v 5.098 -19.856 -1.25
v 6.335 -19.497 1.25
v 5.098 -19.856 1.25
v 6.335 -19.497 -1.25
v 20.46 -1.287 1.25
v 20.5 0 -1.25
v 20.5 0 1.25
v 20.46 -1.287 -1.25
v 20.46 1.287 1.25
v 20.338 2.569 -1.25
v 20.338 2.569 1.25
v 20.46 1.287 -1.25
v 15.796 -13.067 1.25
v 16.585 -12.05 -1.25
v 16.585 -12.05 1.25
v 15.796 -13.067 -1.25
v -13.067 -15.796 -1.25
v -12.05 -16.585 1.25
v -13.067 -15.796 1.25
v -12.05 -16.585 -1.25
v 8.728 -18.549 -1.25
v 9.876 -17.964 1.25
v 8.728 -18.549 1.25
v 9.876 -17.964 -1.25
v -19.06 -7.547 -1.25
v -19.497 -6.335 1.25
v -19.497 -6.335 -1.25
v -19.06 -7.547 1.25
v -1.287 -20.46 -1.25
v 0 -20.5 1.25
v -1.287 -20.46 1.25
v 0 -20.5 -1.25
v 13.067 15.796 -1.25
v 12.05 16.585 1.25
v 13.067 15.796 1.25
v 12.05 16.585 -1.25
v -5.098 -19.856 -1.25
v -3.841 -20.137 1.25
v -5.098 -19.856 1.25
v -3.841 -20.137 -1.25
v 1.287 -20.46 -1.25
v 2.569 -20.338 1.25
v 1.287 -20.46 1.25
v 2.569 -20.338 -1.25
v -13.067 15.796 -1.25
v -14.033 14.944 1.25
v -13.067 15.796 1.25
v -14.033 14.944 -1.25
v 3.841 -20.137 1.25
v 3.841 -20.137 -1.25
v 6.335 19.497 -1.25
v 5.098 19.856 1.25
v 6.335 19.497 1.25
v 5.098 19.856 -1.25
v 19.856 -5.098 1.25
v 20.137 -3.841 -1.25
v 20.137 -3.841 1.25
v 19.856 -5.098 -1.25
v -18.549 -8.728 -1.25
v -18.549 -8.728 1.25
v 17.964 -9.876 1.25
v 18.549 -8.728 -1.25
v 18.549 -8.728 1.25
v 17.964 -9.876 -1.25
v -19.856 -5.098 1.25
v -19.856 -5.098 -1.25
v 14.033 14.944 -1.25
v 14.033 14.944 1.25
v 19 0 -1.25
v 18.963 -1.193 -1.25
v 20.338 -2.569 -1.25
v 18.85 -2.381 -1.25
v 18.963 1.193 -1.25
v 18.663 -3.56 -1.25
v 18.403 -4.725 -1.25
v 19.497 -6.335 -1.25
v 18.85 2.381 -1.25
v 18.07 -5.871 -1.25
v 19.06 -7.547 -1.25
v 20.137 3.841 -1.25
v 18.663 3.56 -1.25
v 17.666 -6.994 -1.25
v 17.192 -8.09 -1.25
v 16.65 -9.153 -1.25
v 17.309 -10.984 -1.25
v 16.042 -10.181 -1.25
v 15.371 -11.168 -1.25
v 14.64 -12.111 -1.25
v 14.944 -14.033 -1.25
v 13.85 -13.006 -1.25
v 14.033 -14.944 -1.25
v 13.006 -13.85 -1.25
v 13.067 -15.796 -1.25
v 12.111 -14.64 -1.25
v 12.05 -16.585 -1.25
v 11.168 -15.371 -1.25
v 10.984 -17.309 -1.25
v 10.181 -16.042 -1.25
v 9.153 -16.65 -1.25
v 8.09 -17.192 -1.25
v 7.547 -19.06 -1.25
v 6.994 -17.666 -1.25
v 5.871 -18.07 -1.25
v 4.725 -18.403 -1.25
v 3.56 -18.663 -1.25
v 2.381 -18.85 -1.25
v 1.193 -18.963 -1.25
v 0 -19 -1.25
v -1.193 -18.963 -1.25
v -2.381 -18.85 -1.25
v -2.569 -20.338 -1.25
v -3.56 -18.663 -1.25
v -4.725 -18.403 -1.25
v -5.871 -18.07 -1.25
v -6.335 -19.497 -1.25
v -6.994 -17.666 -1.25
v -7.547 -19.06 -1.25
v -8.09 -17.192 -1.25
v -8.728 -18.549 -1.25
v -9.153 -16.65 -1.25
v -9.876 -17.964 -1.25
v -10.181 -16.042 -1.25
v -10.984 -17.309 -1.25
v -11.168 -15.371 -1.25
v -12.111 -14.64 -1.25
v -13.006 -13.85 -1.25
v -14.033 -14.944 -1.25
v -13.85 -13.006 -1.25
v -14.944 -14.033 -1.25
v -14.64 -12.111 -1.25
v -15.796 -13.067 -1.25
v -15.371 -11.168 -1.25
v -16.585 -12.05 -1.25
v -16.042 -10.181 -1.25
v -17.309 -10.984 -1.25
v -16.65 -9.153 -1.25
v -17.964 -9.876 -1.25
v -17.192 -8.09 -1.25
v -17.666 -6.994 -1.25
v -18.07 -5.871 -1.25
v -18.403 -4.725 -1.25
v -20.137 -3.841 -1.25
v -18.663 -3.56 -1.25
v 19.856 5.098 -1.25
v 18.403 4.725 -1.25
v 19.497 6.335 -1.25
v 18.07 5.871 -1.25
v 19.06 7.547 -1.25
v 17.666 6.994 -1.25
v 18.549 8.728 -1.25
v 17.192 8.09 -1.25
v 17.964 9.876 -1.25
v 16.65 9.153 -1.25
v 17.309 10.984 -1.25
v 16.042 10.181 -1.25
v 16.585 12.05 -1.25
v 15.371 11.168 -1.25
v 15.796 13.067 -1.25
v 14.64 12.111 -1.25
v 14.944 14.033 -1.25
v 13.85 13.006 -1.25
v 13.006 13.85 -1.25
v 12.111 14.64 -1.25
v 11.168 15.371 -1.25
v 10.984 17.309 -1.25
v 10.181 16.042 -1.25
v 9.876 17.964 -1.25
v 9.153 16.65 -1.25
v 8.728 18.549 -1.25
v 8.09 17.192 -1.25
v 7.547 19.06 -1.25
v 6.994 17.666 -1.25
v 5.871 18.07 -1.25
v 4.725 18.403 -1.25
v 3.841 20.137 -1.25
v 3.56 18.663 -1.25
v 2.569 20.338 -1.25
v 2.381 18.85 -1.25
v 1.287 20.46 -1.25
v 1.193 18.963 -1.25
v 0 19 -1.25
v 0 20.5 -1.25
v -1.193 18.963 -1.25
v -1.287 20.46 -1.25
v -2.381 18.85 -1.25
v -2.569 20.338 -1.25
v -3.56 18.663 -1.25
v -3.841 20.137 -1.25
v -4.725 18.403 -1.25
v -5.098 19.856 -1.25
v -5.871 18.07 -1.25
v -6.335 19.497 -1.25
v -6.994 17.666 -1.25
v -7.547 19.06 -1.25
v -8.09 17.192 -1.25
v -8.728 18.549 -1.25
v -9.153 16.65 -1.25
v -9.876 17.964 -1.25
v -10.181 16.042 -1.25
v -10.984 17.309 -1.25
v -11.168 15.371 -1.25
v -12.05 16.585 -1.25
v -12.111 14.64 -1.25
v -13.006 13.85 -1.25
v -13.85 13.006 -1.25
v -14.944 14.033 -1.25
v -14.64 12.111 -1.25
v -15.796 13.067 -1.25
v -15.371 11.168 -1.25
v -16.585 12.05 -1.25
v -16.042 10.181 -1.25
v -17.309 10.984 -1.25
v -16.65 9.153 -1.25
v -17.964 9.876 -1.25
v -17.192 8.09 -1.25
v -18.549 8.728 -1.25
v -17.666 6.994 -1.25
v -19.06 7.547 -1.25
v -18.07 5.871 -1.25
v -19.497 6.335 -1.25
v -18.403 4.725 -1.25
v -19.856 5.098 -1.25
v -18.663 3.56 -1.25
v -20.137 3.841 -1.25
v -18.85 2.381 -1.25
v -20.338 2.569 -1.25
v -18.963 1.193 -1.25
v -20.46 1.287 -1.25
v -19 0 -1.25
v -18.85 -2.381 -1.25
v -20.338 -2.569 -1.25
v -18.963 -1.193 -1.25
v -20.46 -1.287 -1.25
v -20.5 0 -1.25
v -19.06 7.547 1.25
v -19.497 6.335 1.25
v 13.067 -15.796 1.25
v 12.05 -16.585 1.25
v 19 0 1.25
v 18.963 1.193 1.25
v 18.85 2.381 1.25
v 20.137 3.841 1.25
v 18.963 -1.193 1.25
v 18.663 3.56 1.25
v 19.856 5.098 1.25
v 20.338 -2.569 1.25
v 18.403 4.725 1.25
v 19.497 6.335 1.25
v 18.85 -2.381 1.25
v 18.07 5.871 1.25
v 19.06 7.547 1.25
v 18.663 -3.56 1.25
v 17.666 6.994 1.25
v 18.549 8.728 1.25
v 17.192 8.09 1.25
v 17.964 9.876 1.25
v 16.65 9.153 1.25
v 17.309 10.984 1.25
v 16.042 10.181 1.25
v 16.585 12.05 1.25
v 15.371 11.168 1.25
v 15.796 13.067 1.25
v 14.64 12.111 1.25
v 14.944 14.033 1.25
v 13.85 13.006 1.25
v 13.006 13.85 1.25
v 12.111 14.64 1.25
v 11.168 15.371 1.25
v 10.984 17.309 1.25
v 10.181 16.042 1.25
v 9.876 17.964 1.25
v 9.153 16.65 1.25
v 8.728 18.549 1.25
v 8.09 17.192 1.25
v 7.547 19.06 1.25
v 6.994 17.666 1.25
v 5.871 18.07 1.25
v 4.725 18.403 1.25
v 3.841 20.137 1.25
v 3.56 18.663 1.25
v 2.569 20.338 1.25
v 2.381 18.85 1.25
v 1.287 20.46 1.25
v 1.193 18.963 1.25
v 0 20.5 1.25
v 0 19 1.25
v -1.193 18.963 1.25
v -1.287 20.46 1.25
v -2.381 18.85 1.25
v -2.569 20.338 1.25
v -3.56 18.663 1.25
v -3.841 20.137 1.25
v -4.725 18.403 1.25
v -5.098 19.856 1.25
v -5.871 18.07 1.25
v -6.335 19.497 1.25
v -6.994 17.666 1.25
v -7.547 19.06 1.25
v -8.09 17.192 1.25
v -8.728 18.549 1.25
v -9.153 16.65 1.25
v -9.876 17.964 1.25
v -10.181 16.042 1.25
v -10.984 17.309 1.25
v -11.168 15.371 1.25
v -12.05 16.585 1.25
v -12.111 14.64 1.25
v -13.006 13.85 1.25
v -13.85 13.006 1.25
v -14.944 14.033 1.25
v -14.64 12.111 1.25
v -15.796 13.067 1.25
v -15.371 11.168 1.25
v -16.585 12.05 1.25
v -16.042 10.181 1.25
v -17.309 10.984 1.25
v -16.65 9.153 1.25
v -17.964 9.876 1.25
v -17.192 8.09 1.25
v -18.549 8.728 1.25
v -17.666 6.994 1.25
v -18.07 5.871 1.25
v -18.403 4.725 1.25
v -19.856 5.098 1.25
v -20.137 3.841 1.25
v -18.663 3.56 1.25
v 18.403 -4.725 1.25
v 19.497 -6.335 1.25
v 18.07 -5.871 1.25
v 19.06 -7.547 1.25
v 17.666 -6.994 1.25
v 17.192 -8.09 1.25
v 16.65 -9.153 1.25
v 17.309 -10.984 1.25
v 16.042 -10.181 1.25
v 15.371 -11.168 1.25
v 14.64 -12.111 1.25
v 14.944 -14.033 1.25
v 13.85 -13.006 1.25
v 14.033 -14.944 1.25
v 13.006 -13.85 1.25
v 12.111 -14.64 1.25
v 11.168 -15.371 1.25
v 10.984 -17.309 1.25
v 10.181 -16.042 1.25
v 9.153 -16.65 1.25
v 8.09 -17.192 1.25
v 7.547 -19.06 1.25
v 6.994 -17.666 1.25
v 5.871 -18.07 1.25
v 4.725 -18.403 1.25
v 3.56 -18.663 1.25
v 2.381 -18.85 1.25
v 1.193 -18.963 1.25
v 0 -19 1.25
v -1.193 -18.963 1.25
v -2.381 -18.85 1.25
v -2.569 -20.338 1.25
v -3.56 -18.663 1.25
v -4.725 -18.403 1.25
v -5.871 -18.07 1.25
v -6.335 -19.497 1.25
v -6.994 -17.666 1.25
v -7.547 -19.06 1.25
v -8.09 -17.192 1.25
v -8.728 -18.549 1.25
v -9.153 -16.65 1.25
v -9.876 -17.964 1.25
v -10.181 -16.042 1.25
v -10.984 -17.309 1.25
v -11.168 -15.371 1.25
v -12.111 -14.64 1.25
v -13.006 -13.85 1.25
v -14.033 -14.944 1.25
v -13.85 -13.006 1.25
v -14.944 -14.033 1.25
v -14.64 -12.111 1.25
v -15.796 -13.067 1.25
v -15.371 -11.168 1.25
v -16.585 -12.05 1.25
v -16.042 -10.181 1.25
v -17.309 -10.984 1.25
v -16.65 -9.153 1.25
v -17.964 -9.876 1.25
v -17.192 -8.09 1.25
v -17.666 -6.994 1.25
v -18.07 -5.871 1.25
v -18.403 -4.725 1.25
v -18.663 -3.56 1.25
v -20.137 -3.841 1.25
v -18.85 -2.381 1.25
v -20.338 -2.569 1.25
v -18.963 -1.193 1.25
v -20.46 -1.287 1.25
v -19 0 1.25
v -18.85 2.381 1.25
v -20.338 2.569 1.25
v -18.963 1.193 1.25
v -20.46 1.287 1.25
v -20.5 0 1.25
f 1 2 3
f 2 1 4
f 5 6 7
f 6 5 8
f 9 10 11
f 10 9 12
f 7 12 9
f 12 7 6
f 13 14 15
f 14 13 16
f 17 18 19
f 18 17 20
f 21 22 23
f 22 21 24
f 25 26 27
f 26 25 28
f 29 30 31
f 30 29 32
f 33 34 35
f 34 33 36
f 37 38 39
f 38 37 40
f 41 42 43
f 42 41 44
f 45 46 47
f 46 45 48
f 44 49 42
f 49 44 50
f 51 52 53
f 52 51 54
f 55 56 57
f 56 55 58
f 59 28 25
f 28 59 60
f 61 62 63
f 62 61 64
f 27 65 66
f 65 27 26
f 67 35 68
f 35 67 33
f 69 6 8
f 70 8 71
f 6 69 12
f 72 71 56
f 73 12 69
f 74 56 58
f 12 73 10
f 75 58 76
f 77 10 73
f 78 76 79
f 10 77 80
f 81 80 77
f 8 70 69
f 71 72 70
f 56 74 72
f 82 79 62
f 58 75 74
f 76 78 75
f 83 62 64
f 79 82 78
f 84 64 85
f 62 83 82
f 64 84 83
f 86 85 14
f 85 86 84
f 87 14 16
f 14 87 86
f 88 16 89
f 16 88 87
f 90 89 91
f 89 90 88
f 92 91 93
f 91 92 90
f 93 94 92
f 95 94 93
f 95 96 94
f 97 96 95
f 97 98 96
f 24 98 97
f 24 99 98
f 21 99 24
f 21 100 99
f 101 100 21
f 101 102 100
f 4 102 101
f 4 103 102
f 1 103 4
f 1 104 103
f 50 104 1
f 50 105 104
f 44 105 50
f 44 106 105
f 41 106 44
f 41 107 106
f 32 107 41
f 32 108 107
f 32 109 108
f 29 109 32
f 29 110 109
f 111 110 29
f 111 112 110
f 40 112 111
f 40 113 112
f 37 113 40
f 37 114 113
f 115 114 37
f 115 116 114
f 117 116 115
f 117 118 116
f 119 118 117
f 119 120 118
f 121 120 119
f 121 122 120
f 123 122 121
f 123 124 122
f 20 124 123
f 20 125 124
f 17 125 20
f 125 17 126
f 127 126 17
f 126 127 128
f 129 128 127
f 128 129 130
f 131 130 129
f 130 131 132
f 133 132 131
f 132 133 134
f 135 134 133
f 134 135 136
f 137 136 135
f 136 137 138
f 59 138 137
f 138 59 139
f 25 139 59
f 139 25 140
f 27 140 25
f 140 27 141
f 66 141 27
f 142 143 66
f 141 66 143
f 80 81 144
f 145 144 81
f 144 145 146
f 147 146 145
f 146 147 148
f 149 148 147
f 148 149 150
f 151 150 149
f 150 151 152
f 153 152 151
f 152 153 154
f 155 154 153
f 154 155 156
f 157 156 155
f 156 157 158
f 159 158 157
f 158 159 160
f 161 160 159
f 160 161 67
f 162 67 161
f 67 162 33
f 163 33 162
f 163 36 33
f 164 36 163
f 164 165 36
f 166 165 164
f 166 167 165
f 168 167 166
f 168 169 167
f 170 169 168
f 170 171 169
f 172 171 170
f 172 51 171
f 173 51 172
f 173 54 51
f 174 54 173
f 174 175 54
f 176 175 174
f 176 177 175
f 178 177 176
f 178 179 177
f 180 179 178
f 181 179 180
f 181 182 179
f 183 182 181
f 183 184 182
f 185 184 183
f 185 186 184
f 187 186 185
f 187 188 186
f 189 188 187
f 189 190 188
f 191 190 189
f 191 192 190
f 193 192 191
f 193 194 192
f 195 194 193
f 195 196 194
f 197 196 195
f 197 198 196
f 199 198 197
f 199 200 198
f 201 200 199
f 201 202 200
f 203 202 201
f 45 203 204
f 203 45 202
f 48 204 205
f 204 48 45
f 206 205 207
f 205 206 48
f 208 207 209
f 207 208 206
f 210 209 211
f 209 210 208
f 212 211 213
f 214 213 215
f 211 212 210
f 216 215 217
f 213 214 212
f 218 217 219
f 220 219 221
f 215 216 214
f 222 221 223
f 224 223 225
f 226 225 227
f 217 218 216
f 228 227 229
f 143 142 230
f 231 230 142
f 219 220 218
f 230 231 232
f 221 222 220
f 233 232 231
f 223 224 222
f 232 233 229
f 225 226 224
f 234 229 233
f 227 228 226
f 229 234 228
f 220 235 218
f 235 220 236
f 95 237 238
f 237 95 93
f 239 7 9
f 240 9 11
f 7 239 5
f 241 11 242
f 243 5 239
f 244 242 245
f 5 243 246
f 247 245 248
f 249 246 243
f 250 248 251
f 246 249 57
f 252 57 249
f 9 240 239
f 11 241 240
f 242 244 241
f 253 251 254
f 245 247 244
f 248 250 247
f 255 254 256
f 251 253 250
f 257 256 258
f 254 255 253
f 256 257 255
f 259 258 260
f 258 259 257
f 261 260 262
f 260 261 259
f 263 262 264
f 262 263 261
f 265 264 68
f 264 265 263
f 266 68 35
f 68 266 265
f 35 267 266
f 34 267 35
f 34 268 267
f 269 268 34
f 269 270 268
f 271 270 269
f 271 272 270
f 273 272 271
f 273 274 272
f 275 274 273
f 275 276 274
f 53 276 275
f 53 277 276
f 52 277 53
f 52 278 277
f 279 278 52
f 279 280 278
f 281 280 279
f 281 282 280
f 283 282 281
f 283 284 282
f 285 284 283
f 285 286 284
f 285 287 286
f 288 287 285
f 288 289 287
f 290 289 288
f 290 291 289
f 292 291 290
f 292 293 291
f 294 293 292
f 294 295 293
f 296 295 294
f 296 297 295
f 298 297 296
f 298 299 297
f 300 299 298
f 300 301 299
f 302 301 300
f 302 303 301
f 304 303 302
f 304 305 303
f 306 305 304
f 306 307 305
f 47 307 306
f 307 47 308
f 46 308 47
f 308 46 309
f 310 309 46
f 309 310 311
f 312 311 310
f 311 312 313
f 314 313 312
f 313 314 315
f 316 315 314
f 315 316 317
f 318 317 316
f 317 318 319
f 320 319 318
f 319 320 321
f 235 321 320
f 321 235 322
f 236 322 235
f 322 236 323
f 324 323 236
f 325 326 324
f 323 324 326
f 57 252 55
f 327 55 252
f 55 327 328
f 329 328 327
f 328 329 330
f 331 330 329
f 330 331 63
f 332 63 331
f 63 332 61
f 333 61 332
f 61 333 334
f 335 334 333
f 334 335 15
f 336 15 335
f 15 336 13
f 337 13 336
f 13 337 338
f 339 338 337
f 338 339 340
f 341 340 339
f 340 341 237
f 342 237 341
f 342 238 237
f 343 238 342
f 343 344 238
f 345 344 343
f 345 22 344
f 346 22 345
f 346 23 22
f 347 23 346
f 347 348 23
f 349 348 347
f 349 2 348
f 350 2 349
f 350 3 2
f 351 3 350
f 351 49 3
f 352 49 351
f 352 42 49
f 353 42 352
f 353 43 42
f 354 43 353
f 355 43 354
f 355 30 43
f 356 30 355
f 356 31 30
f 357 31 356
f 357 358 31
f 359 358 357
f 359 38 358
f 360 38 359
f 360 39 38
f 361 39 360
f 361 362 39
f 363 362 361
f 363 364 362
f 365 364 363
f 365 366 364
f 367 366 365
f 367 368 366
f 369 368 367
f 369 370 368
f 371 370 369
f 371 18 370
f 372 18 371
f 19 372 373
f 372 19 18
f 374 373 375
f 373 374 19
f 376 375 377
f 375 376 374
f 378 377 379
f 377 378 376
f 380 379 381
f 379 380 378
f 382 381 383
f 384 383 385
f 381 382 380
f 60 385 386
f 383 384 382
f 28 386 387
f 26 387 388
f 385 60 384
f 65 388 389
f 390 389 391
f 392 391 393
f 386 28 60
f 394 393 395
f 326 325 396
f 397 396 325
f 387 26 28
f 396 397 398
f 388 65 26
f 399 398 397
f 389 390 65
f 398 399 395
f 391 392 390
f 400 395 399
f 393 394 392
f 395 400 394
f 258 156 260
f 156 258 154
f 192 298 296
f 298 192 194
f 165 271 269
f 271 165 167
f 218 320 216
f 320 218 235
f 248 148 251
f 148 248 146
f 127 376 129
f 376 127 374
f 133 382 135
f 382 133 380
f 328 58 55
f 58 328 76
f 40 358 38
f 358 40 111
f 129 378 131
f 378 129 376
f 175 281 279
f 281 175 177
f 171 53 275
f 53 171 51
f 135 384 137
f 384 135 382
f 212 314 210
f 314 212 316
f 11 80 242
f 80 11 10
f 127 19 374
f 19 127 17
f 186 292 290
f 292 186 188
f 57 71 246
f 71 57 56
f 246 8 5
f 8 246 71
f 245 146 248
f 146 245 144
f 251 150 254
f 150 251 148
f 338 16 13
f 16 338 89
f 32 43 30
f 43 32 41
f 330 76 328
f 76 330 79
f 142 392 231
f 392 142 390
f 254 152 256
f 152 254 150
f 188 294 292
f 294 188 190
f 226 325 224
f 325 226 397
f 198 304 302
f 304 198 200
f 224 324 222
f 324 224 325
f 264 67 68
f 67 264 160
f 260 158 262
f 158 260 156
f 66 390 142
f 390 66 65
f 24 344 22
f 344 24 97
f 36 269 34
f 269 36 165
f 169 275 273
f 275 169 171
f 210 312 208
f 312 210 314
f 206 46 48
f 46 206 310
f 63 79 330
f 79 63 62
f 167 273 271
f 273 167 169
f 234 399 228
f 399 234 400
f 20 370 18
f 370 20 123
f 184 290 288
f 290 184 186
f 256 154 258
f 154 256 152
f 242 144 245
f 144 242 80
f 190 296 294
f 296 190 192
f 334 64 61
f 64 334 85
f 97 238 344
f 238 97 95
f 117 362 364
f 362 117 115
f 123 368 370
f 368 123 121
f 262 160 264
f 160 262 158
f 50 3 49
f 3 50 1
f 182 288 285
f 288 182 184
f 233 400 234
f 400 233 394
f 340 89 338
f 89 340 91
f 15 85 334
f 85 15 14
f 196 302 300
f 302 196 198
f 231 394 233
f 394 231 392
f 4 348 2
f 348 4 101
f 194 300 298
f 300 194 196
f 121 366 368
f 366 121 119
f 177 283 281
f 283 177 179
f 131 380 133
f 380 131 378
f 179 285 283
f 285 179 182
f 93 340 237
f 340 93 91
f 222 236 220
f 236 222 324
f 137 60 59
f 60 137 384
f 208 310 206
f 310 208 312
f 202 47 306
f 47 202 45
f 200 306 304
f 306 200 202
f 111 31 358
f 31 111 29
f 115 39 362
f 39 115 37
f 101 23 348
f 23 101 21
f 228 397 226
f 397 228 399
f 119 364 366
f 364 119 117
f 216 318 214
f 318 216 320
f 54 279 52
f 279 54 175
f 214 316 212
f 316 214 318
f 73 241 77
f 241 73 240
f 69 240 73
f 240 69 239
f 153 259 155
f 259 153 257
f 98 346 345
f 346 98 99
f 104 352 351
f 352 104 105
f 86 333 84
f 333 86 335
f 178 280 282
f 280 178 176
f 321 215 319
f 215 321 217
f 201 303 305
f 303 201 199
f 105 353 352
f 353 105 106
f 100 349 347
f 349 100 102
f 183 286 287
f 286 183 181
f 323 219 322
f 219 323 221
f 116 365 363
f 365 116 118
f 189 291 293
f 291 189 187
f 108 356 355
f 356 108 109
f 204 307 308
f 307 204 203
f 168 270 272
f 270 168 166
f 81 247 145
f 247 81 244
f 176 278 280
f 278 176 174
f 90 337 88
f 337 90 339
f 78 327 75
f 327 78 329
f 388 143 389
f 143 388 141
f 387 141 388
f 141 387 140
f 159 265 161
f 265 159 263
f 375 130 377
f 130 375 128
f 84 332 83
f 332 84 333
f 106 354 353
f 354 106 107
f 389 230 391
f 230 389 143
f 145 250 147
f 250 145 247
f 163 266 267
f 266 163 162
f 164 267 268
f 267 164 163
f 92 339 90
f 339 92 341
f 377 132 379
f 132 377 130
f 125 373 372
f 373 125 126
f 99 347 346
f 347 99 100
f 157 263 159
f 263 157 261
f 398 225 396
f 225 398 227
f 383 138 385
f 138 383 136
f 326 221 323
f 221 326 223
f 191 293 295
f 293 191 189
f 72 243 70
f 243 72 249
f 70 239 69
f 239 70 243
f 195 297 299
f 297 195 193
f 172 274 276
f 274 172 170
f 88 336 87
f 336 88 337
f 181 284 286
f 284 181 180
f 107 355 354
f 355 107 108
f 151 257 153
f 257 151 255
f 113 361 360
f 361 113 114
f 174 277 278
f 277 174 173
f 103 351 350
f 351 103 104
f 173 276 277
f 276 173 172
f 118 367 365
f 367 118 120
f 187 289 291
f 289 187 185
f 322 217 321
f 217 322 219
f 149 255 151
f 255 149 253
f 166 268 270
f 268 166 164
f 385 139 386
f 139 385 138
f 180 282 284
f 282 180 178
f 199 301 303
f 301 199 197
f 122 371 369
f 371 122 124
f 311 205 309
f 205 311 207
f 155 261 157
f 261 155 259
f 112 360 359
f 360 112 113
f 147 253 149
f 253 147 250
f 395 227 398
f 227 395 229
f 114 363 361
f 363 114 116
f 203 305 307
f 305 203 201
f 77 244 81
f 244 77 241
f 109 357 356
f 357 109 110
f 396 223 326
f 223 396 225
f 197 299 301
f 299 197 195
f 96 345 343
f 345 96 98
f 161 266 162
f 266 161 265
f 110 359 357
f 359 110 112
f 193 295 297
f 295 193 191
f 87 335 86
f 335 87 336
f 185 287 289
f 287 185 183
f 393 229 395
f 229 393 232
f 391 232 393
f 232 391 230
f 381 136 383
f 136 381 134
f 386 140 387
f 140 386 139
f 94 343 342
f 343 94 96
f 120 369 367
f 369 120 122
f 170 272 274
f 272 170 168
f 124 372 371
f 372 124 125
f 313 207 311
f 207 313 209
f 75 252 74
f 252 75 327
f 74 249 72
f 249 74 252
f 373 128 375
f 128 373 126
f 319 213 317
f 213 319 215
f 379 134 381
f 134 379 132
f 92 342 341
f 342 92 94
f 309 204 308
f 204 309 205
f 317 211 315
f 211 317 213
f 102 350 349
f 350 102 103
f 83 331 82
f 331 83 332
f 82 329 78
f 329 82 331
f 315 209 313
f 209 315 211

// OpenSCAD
// Meta Shades - IR Transmissive Optical Lens Inserts
$fn = 100;

module ir_lens_insert() {
    difference() {
        // Outer lens perimeter matching frame socket
        cylinder(h=2.5, r=20.5, center=true);
        
        // Inner optical distortion clearance
        cylinder(h=3.0, r=19.0, center=true);
    }
}

ir_lens_insert();
